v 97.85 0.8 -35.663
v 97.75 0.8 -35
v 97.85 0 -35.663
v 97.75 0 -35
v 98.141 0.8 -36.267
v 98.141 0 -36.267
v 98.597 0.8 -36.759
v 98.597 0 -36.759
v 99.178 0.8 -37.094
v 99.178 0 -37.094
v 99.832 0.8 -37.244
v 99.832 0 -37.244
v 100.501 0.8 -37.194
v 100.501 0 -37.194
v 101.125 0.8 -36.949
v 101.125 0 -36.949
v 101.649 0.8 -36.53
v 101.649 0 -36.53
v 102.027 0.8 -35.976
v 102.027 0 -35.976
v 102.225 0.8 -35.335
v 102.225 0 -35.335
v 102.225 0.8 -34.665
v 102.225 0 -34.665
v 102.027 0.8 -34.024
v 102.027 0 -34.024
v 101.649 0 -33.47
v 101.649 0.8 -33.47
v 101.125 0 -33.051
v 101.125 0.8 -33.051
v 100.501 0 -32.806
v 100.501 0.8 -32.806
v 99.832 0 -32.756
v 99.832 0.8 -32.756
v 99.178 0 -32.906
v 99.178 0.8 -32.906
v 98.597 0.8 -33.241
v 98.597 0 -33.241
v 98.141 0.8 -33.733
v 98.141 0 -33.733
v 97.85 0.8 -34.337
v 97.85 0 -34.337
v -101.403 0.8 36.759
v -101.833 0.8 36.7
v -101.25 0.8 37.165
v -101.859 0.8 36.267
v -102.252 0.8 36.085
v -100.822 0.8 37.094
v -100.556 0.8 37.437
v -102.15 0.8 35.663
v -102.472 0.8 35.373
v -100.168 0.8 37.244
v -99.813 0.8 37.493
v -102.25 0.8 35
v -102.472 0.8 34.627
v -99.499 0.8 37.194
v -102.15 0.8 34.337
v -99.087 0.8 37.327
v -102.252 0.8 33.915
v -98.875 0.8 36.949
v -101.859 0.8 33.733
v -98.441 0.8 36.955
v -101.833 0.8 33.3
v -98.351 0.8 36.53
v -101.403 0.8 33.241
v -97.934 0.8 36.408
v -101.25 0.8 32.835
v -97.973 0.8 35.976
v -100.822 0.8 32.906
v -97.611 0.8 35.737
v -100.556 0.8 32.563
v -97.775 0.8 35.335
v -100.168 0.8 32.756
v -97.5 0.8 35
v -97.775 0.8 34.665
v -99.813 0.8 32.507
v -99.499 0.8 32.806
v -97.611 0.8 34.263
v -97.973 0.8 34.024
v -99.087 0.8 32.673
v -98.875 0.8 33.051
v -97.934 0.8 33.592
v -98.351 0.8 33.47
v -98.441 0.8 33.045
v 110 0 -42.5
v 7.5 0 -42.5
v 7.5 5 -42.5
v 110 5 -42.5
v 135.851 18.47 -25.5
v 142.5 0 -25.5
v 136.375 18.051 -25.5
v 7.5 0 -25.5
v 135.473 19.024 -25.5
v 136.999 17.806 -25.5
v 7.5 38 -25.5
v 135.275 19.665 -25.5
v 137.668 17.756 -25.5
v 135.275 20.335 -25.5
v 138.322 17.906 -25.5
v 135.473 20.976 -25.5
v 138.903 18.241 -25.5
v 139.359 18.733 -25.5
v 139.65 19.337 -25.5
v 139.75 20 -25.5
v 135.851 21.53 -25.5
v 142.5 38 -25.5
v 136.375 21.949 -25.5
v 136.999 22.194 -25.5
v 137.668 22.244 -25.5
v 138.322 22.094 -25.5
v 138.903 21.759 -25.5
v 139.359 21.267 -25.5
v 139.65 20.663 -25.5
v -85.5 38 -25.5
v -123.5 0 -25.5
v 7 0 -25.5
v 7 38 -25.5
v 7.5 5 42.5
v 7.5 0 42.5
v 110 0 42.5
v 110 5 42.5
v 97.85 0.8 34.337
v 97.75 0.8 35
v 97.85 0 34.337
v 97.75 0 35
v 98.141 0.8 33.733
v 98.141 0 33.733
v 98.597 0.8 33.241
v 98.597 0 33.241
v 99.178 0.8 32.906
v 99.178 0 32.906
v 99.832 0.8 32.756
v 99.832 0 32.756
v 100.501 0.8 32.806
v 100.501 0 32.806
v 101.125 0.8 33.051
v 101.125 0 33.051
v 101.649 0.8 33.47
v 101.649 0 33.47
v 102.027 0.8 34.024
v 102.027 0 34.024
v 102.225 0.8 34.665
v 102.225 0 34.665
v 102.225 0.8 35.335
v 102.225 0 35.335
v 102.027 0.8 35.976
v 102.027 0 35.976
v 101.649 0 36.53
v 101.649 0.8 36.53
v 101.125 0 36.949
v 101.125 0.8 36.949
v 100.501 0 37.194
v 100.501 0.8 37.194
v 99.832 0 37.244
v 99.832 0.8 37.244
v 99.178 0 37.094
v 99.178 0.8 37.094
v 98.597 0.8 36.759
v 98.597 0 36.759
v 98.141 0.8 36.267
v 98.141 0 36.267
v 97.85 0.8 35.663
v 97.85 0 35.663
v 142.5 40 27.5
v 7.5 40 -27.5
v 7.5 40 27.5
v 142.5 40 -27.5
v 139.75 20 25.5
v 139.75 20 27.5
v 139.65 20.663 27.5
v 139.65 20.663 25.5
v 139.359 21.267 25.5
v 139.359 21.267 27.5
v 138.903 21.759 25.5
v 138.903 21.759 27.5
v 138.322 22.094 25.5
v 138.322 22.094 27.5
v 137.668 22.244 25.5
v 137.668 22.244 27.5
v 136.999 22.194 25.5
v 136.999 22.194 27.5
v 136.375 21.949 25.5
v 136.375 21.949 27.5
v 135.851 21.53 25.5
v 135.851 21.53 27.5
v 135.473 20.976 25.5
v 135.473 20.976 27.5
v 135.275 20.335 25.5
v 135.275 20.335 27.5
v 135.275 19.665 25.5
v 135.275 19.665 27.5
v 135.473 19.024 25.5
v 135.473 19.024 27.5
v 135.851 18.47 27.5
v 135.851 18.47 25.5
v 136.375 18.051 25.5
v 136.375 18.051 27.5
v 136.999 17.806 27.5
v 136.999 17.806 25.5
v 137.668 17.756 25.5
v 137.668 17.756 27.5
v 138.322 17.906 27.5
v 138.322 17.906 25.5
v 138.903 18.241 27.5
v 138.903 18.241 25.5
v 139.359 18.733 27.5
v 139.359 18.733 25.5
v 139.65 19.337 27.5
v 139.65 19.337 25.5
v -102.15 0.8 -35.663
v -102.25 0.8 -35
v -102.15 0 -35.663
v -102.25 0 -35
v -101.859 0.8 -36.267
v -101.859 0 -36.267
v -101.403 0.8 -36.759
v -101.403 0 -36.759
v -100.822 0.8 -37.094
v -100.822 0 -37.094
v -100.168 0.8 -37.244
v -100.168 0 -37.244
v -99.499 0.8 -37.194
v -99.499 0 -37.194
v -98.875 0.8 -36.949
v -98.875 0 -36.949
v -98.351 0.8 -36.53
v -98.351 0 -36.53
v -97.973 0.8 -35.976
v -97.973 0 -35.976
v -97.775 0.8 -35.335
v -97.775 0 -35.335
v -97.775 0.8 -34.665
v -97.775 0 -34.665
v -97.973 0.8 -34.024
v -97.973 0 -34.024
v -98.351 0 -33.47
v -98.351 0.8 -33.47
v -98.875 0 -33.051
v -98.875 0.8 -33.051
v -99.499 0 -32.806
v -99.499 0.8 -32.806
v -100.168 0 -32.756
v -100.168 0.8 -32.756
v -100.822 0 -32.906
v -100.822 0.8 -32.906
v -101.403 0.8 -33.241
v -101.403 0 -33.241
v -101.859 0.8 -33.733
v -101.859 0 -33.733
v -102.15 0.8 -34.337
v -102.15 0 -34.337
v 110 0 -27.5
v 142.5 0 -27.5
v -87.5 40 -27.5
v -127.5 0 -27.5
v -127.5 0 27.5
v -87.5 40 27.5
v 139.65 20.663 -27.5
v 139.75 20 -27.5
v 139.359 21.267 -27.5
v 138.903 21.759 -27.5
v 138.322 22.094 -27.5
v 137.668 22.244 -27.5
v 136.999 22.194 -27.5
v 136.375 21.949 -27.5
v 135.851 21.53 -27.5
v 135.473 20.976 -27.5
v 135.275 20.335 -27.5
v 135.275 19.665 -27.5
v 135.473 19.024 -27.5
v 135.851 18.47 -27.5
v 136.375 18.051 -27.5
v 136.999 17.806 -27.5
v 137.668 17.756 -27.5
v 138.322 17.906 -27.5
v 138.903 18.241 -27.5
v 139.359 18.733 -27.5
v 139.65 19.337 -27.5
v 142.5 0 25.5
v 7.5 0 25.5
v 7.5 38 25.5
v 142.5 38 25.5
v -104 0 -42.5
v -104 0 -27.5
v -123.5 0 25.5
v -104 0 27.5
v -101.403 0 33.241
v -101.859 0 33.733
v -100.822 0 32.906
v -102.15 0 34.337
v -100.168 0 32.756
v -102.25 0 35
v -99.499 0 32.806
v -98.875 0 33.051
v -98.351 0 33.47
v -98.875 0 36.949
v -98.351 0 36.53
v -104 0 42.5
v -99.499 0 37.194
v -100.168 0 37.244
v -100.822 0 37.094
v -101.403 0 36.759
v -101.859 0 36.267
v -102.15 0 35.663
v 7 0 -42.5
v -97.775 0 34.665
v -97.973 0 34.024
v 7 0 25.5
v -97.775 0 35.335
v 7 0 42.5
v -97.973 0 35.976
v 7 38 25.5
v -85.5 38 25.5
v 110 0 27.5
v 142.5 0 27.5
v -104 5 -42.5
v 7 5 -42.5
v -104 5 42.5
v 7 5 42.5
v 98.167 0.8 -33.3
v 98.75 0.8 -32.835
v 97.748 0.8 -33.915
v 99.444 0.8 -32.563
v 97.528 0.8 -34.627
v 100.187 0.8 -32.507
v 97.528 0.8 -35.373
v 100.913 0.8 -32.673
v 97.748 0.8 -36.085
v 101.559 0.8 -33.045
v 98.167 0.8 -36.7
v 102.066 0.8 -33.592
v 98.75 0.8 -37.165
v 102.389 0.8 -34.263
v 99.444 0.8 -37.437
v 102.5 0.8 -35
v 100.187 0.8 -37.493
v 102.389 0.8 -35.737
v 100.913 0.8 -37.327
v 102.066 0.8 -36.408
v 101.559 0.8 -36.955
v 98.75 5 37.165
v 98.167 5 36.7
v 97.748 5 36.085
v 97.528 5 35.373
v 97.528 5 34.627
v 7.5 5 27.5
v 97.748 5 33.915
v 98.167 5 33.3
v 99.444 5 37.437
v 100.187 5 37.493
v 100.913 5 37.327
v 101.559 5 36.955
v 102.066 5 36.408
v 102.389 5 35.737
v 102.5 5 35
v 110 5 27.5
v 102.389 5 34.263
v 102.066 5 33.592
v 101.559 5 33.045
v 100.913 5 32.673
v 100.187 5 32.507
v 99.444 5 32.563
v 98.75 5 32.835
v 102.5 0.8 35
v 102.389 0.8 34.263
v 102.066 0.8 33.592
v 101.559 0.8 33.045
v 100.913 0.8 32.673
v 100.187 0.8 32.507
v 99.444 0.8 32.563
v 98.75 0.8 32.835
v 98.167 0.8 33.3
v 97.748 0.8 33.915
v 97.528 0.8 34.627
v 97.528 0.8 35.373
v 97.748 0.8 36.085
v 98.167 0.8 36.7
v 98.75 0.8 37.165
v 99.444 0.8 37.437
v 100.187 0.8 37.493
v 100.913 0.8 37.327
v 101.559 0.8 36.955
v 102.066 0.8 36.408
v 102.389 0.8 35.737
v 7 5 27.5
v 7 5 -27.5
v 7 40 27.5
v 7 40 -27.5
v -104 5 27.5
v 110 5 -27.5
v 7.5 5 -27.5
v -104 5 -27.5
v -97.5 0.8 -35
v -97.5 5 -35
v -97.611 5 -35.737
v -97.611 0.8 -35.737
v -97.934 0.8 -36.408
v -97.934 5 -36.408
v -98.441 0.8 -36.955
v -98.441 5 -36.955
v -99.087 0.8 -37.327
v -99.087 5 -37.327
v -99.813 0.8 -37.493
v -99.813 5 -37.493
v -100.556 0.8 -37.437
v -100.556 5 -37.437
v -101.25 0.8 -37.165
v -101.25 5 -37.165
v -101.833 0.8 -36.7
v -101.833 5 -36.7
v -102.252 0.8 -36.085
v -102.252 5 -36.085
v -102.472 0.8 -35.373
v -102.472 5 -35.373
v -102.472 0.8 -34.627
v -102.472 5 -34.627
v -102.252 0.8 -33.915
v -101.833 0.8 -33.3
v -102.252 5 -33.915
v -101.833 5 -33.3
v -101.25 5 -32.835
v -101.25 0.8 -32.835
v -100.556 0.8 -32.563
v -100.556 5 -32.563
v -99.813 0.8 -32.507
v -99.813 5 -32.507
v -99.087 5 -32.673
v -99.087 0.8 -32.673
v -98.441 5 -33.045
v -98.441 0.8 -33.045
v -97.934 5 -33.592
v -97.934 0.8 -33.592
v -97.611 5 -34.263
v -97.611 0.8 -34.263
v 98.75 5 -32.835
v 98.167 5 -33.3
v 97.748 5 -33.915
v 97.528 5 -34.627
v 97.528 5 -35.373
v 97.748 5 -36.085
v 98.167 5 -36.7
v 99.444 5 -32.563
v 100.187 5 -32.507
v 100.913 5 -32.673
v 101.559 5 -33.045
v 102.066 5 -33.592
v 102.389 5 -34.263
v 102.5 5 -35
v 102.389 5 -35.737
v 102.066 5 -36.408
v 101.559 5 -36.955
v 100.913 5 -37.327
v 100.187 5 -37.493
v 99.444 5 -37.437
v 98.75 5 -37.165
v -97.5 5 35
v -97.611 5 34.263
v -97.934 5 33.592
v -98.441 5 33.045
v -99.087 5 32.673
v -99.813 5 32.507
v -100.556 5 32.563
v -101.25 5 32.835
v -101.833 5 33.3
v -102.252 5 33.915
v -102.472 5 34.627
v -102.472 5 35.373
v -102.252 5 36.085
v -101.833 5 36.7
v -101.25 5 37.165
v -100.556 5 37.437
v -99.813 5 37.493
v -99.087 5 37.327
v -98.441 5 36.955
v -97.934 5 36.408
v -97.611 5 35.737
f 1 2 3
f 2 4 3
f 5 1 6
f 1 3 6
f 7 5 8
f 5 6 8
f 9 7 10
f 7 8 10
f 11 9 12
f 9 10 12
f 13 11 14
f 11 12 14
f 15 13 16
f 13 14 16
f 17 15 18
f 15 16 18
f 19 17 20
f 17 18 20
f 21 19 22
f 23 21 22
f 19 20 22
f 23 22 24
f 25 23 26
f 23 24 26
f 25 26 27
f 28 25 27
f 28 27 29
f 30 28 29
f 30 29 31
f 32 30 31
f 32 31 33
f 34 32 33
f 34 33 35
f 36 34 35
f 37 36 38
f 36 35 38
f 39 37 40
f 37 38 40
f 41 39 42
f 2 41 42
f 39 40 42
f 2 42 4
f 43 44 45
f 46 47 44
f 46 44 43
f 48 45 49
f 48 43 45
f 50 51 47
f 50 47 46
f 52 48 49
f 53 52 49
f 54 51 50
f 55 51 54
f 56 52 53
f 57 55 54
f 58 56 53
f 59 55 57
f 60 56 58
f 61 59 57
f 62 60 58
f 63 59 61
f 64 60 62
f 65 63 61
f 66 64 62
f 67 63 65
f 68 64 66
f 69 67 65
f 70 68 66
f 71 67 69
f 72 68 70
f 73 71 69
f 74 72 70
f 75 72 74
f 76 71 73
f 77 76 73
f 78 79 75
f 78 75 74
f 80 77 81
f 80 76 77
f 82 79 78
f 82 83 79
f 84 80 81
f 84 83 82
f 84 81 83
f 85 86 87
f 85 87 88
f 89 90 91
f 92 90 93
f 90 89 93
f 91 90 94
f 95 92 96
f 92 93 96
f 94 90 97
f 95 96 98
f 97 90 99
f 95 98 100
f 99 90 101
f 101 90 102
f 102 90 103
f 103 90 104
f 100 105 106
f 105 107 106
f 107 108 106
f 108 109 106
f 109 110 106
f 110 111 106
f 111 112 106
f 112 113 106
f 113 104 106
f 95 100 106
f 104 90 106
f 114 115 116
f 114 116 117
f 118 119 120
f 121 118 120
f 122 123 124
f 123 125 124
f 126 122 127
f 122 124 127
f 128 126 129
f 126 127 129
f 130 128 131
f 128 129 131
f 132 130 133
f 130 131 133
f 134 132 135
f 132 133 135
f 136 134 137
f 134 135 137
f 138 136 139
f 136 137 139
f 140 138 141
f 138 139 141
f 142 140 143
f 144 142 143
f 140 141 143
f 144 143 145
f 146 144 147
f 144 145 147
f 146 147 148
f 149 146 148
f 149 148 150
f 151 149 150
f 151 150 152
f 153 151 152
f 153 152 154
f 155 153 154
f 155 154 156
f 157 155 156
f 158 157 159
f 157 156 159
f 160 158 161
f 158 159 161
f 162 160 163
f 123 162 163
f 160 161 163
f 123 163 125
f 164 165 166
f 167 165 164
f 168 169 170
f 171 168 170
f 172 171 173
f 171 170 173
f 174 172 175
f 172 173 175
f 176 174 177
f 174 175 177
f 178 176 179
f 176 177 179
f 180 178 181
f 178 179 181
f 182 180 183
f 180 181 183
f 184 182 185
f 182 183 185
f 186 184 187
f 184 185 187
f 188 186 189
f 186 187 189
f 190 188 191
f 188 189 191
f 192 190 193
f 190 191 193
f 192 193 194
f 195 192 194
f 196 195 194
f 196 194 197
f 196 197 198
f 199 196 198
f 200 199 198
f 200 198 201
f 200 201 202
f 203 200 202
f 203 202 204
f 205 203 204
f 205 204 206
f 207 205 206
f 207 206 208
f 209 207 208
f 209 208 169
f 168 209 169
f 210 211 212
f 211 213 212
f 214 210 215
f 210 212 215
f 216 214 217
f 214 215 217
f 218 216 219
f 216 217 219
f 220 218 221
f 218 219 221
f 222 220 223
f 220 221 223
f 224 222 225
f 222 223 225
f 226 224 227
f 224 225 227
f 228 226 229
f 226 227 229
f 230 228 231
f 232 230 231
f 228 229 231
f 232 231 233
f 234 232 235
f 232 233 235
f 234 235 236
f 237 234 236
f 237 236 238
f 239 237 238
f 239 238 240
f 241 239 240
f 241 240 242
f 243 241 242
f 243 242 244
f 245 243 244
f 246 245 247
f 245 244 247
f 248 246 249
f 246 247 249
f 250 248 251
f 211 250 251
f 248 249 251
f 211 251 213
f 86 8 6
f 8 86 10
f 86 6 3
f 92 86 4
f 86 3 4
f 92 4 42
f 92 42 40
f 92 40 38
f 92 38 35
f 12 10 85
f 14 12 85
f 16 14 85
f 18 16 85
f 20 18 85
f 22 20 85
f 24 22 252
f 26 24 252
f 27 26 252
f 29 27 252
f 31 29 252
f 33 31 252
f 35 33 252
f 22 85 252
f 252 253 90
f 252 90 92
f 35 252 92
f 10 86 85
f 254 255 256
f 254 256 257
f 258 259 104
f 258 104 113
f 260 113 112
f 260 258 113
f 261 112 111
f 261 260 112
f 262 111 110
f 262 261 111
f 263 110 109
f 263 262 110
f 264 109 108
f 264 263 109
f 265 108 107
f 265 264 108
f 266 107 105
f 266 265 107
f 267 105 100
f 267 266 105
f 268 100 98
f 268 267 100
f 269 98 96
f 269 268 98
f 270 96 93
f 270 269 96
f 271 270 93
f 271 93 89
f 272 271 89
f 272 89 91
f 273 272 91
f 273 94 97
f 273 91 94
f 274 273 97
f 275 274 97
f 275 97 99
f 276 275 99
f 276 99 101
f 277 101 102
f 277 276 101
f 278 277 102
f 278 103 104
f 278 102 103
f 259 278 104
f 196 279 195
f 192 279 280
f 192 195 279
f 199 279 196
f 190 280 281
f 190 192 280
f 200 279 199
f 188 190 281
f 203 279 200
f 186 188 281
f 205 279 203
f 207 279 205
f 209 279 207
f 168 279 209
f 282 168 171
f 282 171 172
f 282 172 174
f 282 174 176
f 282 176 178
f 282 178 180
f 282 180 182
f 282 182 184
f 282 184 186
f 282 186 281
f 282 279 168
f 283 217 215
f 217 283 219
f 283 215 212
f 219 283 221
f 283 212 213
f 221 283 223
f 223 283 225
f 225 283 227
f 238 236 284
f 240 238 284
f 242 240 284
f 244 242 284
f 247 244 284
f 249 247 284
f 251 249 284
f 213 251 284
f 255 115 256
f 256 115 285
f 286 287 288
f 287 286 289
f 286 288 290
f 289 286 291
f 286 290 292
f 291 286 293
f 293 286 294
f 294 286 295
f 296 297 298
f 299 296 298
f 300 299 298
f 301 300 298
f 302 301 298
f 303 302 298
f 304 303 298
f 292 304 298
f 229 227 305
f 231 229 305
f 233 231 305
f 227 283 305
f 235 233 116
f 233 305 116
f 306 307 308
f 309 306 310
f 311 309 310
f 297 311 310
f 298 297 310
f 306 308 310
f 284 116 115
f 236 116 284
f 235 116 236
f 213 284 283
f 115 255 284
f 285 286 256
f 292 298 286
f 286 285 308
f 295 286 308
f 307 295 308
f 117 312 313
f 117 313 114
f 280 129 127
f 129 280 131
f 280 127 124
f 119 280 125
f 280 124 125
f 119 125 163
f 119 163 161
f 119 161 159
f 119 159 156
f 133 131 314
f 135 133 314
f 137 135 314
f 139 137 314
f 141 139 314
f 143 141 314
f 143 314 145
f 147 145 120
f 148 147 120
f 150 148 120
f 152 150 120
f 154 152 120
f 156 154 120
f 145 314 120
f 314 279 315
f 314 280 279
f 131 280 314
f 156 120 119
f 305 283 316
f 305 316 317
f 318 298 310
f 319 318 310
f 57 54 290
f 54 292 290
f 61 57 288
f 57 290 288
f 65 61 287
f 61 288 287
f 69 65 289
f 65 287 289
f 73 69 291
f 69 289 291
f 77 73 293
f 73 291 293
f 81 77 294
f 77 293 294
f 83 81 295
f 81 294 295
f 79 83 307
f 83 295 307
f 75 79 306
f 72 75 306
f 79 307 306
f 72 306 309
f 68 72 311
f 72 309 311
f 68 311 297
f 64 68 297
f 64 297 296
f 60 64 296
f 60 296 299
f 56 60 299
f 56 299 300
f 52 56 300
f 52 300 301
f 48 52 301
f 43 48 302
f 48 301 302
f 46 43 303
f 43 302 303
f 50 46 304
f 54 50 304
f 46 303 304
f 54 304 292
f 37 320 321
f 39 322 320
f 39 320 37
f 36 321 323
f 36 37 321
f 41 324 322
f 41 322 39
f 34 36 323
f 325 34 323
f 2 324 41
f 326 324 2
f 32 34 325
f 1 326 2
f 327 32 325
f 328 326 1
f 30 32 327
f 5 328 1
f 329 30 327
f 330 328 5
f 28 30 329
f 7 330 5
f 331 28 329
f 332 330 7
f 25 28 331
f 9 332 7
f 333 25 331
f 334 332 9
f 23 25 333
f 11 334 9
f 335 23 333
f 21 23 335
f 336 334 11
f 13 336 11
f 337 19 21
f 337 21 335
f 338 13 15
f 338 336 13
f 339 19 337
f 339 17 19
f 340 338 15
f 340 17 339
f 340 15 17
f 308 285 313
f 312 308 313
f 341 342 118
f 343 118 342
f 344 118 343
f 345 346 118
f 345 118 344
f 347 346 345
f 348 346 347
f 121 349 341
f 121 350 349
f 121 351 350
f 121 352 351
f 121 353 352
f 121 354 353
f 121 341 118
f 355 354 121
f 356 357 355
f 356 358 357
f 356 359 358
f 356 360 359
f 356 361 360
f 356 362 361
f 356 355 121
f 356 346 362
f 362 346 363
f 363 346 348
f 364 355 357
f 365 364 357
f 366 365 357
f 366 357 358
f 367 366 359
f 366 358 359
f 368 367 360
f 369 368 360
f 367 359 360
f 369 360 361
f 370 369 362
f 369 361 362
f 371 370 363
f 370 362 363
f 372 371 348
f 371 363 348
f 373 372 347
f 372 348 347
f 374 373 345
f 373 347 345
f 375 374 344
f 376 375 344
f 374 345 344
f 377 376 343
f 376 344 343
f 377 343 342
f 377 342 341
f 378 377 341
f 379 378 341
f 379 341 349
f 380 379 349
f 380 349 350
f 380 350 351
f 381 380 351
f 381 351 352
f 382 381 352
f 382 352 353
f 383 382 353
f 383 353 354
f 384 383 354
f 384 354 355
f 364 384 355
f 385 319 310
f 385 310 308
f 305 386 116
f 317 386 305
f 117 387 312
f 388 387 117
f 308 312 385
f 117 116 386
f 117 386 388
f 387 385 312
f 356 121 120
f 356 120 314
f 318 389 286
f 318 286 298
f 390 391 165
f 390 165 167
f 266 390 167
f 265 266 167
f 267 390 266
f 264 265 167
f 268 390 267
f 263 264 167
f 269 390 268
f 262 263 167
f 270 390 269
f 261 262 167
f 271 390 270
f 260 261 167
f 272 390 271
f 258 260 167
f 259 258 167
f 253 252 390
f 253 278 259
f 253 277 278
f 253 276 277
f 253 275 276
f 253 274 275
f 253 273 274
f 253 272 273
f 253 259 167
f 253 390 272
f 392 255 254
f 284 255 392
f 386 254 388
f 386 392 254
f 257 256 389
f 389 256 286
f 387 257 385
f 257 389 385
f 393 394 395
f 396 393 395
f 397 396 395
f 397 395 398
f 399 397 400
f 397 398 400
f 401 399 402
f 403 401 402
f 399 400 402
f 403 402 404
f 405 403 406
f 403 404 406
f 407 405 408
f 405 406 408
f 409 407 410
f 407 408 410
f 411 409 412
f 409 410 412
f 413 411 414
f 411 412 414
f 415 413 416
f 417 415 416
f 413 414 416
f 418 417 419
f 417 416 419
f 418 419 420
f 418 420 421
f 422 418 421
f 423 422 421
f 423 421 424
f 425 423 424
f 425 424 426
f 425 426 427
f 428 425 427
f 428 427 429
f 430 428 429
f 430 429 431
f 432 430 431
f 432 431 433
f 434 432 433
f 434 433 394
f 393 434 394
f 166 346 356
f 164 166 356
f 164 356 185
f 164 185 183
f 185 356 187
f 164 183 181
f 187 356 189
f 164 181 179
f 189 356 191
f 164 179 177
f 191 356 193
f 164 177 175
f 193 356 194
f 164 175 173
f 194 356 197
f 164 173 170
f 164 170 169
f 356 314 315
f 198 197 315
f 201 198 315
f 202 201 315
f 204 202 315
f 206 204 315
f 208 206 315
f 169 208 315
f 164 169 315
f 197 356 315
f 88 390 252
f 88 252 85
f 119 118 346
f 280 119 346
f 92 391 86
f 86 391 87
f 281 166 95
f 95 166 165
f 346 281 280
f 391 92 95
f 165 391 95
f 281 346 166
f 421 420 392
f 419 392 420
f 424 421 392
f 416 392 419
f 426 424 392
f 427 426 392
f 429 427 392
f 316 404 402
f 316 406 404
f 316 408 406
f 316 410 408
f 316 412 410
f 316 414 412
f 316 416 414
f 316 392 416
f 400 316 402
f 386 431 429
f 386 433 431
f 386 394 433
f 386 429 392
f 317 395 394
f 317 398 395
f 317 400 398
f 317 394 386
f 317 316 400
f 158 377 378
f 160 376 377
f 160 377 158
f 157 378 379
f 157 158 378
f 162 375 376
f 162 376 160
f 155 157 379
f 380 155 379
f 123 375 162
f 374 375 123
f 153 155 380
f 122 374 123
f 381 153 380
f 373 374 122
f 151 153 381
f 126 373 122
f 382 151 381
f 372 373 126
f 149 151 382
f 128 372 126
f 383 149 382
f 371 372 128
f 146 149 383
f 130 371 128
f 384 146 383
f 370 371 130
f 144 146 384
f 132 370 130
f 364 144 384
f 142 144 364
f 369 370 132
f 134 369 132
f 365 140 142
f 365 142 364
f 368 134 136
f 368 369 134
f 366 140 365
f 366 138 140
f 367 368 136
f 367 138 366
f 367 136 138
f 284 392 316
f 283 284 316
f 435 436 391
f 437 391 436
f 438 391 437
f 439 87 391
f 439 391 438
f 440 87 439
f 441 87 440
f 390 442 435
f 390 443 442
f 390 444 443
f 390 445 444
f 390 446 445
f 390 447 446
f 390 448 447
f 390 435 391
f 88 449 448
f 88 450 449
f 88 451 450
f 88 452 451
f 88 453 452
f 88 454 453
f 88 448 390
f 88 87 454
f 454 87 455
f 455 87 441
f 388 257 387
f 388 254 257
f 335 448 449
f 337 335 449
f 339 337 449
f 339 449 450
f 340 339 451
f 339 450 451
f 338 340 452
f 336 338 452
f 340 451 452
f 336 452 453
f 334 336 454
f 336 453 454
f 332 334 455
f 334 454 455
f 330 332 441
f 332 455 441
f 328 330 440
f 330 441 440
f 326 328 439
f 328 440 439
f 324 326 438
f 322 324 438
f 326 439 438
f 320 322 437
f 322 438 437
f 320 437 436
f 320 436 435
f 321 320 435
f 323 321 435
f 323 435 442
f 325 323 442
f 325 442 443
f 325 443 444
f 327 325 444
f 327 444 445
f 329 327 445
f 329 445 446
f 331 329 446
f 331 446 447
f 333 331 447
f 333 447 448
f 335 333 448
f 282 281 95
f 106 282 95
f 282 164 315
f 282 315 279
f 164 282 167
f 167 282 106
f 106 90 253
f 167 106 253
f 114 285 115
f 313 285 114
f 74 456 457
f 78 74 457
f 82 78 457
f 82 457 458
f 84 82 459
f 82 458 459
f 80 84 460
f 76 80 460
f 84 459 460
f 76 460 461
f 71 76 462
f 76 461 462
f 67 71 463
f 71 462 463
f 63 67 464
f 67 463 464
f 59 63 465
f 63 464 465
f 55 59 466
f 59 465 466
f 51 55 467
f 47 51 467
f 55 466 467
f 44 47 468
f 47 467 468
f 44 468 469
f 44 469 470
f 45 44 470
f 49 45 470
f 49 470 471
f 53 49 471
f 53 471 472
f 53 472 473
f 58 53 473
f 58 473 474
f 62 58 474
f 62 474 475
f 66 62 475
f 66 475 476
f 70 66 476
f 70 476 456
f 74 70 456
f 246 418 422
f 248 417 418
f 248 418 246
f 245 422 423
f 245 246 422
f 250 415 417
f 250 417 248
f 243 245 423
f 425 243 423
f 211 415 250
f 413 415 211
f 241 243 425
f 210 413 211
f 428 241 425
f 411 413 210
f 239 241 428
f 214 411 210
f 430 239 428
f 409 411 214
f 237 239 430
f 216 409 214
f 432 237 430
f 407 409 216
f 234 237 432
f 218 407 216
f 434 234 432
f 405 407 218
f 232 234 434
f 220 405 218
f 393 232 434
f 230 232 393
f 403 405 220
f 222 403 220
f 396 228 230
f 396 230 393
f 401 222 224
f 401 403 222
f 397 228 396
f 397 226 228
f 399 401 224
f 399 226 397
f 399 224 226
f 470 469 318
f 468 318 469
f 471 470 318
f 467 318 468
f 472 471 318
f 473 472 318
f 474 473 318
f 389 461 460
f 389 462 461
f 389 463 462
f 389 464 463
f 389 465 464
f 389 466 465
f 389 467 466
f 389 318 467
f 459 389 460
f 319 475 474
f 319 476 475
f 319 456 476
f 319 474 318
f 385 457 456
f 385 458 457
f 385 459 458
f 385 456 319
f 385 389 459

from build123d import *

# Parameters (mm, degrees)
SKETCH1_W                               = 270
SKETCH1_H                               = 85
SKETCH1_W_2                             = 251
SKETCH1_H_2                             = 51
BOSS_EXTRUDE1_DEPTH                     = 5
SKETCH2_W                               = 15
SKETCH2_H                               = 55
SKETCH2_W_2                             = 255
SKETCH2_W_3                             = 251
SKETCH2_H_2                             = 51
BOSS_EXTRUDE2_DEPTH                     = 35
SKETCH3_W                               = 270
SKETCH3_H                               = 55
BOSS_EXTRUDE3_DEPTH                     = 2
SKETCH4_W                               = 51
SKETCH4_H                               = 38
CUT_EXTRUDE1_DEPTH                      = 17
CBORE_FOR_M5_HEX_HEAD_BOLT1_D           = 4.5
CBORE_FOR_M5_HEX_HEAD_BOLT1_CBORE_D     = 5
CBORE_FOR_M5_HEX_HEAD_BOLT1_CBORE_DEPTH = 4.2
SKETCH8_W                               = 32.5
SKETCH8_H                               = 15
CUT_EXTRUDE2_DEPTH                      = 10
SKETCH9_W                               = 38.5
SKETCH9_H                               = 15
CUT_EXTRUDE3_DEPTH                      = 10
M4_CLEARANCE_HOLE1_D                    = 4.5
M4_CLEARANCE_HOLE1_DEPTH                = 17
CHAMFER1_SIZE                           = 40
SKETCH13_W                              = 93.197542006
SKETCH13_H                              = 99.683664526
CUT_EXTRUDE4_DEPTH                      = 0.5


with BuildPart() as part:
    # Sketch1 → Boss-Extrude1 (new body)
    with BuildSketch(Plane(origin=(0, 0, 0), x_dir=(1, 0, 0), z_dir=(0, 1, 0))):
        with Locations((7.5, 0)):
            Rectangle(SKETCH1_W, SKETCH1_H)
        Rectangle(SKETCH1_W_2, SKETCH1_H_2, mode=Mode.SUBTRACT)
    extrude(amount=BOSS_EXTRUDE1_DEPTH)

    # Sketch2 → Boss-Extrude2 (add)
    # profile 1 of 2: a face of its own
    with BuildSketch(Plane(origin=(0, 5, 0), x_dir=(1, 0, 0), z_dir=(0, 1, 0))):
        with Locations((135, 0)):
            Rectangle(SKETCH2_W, SKETCH2_H)
    # profile 2 of 2: a face of its own
    with BuildSketch(Plane(origin=(0, 5, 0), x_dir=(1, 0, 0), z_dir=(0, 1, 0))):
        Rectangle(SKETCH2_W_2, SKETCH2_H)
        Rectangle(SKETCH2_W_3, SKETCH2_H_2, mode=Mode.SUBTRACT)
    extrude(amount=BOSS_EXTRUDE2_DEPTH)

    # Sketch3 → Boss-Extrude3 (add)
    with BuildSketch(Plane(origin=(0, 40, 0), x_dir=(1, 0, 0), z_dir=(0, 1, 0))):
        with Locations((7.5, 0)):
            Rectangle(SKETCH3_W, SKETCH3_H)
    extrude(amount=-BOSS_EXTRUDE3_DEPTH)

    # Sketch4 → Cut-Extrude1 (cut)
    with BuildSketch(Plane(origin=(142.5, 0, 0), x_dir=(0, 0, -1), z_dir=(1, 0, 0))):
        with Locations((0, 19)):
            Rectangle(SKETCH4_W, SKETCH4_H)
    extrude(amount=-CUT_EXTRUDE1_DEPTH, mode=Mode.SUBTRACT)

    # CBORE for M5 Hex Head Bolt1 (through all)
    with Locations(Plane(origin=(0, 5, 0), x_dir=(1, 0, 0), z_dir=(0, 1, 0))):
        with Locations((100, 35), (-100, -35), (-100, 35), (100, -35)):
            CounterBoreHole(CBORE_FOR_M5_HEX_HEAD_BOLT1_D / 2, CBORE_FOR_M5_HEX_HEAD_BOLT1_CBORE_D / 2, CBORE_FOR_M5_HEX_HEAD_BOLT1_CBORE_DEPTH)

    # Sketch8 → Cut-Extrude2 (cut)
    with BuildSketch(Plane(origin=(0, 5, 0), x_dir=(1, 0, 0), z_dir=(0, 1, 0))):
        with Locations((126.25, 35)):
            Rectangle(SKETCH8_W, SKETCH8_H)
        with Locations((126.25, -35)):
            Rectangle(SKETCH8_W, SKETCH8_H)
    extrude(amount=-CUT_EXTRUDE2_DEPTH, mode=Mode.SUBTRACT)

    # Sketch9 → Cut-Extrude3 (cut)
    with BuildSketch(Plane(origin=(0, 5, 0), x_dir=(1, 0, 0), z_dir=(0, 1, 0))):
        with Locations((-123.25, 35)):
            Rectangle(SKETCH9_W, SKETCH9_H)
    cut_extrude3 = extrude(amount=-CUT_EXTRUDE3_DEPTH, mode=Mode.SUBTRACT)

    # Mirror1: Cut-Extrude3 across plane
    add(cut_extrude3.mirror(Plane.XY), mode=Mode.SUBTRACT)

    # M4 Clearance Hole1
    with Locations(Plane(origin=(0, 0, 25.5), x_dir=(-1, 0, 0), z_dir=(0, 0, -1))):
        with Locations((-137.5, 20)):
            m4_clearance_hole1 = Hole(M4_CLEARANCE_HOLE1_D / 2, depth=M4_CLEARANCE_HOLE1_DEPTH)

    # Mirror2: M4 Clearance Hole1 across plane
    add(m4_clearance_hole1.mirror(Plane.XY), mode=Mode.SUBTRACT)

    # Chamfer1
    # the kernel refuses this chamfer: 40 mm, written as the material it adds along each edge
    with BuildSketch(Plane(origin=(-125.5, 38, 25.5), x_dir=(-0.027495876610586317, -0.9996219169112968, 0), z_dir=(0, 0, -1))) as chamfer1_piece_1_section:
        Polygon((CHAMFER1_SIZE * 0.999621916911, -CHAMFER1_SIZE * 0.0274958766106), (-CHAMFER1_SIZE * 0.0274958766106, -CHAMFER1_SIZE * 0.999621916911), (0, 0), align=None)
    chamfer1_piece_1 = extrude(amount=51, mode=Mode.PRIVATE)
    chamfer1_piece_1 = split(chamfer1_piece_1, bisect_by=Plane(origin=(-112.198216197, 0, 0), z_dir=(0, 1, 0)), keep=Keep.TOP, mode=Mode.PRIVATE)
    add(chamfer1_piece_1)
    # the kernel refuses this chamfer: 40 mm, written as the material it takes off along each edge
    with BuildSketch(Plane(origin=(-127.5, 40, -130.367319519), x_dir=(-0.027495876610586317, -0.9996219169112968, 0), z_dir=(0, 0, 1))) as chamfer1_2_piece_1:
        Polygon((CHAMFER1_SIZE * 0.999621916911, CHAMFER1_SIZE * 0.0274958766106), (-CHAMFER1_SIZE * 0.0274958766106, CHAMFER1_SIZE * 0.999621916911), (0, 0), align=None)
    extrude(amount=260.734639037, mode=Mode.SUBTRACT)

    # Sketch13 → Cut-Extrude4 (cut)
    with BuildSketch(Plane(origin=(7.5, 0, 0), x_dir=(0, 0, -1), z_dir=(1, 0, 0))):
        Rectangle(SKETCH13_W, SKETCH13_H)
    extrude(amount=-CUT_EXTRUDE4_DEPTH, mode=Mode.SUBTRACT)


with BuildPart() as cut_extrude4_piece_1:
    # of the separate pieces the step leaves, piece 1, a body of its own (cut_extrude4_pieces)
    add(part.part.solids().sort_by_distance((-123.5, 0, 25.5))[0])


with BuildPart() as cut_extrude4_piece_2:
    # of the separate pieces the step leaves, piece 2, a body of its own (cut_extrude4_pieces)
    add(part.part.solids().sort_by_distance((7.5, 38, 25.5))[0])


solid = Compound([cut_extrude4_piece_1.part, cut_extrude4_piece_2.part])
